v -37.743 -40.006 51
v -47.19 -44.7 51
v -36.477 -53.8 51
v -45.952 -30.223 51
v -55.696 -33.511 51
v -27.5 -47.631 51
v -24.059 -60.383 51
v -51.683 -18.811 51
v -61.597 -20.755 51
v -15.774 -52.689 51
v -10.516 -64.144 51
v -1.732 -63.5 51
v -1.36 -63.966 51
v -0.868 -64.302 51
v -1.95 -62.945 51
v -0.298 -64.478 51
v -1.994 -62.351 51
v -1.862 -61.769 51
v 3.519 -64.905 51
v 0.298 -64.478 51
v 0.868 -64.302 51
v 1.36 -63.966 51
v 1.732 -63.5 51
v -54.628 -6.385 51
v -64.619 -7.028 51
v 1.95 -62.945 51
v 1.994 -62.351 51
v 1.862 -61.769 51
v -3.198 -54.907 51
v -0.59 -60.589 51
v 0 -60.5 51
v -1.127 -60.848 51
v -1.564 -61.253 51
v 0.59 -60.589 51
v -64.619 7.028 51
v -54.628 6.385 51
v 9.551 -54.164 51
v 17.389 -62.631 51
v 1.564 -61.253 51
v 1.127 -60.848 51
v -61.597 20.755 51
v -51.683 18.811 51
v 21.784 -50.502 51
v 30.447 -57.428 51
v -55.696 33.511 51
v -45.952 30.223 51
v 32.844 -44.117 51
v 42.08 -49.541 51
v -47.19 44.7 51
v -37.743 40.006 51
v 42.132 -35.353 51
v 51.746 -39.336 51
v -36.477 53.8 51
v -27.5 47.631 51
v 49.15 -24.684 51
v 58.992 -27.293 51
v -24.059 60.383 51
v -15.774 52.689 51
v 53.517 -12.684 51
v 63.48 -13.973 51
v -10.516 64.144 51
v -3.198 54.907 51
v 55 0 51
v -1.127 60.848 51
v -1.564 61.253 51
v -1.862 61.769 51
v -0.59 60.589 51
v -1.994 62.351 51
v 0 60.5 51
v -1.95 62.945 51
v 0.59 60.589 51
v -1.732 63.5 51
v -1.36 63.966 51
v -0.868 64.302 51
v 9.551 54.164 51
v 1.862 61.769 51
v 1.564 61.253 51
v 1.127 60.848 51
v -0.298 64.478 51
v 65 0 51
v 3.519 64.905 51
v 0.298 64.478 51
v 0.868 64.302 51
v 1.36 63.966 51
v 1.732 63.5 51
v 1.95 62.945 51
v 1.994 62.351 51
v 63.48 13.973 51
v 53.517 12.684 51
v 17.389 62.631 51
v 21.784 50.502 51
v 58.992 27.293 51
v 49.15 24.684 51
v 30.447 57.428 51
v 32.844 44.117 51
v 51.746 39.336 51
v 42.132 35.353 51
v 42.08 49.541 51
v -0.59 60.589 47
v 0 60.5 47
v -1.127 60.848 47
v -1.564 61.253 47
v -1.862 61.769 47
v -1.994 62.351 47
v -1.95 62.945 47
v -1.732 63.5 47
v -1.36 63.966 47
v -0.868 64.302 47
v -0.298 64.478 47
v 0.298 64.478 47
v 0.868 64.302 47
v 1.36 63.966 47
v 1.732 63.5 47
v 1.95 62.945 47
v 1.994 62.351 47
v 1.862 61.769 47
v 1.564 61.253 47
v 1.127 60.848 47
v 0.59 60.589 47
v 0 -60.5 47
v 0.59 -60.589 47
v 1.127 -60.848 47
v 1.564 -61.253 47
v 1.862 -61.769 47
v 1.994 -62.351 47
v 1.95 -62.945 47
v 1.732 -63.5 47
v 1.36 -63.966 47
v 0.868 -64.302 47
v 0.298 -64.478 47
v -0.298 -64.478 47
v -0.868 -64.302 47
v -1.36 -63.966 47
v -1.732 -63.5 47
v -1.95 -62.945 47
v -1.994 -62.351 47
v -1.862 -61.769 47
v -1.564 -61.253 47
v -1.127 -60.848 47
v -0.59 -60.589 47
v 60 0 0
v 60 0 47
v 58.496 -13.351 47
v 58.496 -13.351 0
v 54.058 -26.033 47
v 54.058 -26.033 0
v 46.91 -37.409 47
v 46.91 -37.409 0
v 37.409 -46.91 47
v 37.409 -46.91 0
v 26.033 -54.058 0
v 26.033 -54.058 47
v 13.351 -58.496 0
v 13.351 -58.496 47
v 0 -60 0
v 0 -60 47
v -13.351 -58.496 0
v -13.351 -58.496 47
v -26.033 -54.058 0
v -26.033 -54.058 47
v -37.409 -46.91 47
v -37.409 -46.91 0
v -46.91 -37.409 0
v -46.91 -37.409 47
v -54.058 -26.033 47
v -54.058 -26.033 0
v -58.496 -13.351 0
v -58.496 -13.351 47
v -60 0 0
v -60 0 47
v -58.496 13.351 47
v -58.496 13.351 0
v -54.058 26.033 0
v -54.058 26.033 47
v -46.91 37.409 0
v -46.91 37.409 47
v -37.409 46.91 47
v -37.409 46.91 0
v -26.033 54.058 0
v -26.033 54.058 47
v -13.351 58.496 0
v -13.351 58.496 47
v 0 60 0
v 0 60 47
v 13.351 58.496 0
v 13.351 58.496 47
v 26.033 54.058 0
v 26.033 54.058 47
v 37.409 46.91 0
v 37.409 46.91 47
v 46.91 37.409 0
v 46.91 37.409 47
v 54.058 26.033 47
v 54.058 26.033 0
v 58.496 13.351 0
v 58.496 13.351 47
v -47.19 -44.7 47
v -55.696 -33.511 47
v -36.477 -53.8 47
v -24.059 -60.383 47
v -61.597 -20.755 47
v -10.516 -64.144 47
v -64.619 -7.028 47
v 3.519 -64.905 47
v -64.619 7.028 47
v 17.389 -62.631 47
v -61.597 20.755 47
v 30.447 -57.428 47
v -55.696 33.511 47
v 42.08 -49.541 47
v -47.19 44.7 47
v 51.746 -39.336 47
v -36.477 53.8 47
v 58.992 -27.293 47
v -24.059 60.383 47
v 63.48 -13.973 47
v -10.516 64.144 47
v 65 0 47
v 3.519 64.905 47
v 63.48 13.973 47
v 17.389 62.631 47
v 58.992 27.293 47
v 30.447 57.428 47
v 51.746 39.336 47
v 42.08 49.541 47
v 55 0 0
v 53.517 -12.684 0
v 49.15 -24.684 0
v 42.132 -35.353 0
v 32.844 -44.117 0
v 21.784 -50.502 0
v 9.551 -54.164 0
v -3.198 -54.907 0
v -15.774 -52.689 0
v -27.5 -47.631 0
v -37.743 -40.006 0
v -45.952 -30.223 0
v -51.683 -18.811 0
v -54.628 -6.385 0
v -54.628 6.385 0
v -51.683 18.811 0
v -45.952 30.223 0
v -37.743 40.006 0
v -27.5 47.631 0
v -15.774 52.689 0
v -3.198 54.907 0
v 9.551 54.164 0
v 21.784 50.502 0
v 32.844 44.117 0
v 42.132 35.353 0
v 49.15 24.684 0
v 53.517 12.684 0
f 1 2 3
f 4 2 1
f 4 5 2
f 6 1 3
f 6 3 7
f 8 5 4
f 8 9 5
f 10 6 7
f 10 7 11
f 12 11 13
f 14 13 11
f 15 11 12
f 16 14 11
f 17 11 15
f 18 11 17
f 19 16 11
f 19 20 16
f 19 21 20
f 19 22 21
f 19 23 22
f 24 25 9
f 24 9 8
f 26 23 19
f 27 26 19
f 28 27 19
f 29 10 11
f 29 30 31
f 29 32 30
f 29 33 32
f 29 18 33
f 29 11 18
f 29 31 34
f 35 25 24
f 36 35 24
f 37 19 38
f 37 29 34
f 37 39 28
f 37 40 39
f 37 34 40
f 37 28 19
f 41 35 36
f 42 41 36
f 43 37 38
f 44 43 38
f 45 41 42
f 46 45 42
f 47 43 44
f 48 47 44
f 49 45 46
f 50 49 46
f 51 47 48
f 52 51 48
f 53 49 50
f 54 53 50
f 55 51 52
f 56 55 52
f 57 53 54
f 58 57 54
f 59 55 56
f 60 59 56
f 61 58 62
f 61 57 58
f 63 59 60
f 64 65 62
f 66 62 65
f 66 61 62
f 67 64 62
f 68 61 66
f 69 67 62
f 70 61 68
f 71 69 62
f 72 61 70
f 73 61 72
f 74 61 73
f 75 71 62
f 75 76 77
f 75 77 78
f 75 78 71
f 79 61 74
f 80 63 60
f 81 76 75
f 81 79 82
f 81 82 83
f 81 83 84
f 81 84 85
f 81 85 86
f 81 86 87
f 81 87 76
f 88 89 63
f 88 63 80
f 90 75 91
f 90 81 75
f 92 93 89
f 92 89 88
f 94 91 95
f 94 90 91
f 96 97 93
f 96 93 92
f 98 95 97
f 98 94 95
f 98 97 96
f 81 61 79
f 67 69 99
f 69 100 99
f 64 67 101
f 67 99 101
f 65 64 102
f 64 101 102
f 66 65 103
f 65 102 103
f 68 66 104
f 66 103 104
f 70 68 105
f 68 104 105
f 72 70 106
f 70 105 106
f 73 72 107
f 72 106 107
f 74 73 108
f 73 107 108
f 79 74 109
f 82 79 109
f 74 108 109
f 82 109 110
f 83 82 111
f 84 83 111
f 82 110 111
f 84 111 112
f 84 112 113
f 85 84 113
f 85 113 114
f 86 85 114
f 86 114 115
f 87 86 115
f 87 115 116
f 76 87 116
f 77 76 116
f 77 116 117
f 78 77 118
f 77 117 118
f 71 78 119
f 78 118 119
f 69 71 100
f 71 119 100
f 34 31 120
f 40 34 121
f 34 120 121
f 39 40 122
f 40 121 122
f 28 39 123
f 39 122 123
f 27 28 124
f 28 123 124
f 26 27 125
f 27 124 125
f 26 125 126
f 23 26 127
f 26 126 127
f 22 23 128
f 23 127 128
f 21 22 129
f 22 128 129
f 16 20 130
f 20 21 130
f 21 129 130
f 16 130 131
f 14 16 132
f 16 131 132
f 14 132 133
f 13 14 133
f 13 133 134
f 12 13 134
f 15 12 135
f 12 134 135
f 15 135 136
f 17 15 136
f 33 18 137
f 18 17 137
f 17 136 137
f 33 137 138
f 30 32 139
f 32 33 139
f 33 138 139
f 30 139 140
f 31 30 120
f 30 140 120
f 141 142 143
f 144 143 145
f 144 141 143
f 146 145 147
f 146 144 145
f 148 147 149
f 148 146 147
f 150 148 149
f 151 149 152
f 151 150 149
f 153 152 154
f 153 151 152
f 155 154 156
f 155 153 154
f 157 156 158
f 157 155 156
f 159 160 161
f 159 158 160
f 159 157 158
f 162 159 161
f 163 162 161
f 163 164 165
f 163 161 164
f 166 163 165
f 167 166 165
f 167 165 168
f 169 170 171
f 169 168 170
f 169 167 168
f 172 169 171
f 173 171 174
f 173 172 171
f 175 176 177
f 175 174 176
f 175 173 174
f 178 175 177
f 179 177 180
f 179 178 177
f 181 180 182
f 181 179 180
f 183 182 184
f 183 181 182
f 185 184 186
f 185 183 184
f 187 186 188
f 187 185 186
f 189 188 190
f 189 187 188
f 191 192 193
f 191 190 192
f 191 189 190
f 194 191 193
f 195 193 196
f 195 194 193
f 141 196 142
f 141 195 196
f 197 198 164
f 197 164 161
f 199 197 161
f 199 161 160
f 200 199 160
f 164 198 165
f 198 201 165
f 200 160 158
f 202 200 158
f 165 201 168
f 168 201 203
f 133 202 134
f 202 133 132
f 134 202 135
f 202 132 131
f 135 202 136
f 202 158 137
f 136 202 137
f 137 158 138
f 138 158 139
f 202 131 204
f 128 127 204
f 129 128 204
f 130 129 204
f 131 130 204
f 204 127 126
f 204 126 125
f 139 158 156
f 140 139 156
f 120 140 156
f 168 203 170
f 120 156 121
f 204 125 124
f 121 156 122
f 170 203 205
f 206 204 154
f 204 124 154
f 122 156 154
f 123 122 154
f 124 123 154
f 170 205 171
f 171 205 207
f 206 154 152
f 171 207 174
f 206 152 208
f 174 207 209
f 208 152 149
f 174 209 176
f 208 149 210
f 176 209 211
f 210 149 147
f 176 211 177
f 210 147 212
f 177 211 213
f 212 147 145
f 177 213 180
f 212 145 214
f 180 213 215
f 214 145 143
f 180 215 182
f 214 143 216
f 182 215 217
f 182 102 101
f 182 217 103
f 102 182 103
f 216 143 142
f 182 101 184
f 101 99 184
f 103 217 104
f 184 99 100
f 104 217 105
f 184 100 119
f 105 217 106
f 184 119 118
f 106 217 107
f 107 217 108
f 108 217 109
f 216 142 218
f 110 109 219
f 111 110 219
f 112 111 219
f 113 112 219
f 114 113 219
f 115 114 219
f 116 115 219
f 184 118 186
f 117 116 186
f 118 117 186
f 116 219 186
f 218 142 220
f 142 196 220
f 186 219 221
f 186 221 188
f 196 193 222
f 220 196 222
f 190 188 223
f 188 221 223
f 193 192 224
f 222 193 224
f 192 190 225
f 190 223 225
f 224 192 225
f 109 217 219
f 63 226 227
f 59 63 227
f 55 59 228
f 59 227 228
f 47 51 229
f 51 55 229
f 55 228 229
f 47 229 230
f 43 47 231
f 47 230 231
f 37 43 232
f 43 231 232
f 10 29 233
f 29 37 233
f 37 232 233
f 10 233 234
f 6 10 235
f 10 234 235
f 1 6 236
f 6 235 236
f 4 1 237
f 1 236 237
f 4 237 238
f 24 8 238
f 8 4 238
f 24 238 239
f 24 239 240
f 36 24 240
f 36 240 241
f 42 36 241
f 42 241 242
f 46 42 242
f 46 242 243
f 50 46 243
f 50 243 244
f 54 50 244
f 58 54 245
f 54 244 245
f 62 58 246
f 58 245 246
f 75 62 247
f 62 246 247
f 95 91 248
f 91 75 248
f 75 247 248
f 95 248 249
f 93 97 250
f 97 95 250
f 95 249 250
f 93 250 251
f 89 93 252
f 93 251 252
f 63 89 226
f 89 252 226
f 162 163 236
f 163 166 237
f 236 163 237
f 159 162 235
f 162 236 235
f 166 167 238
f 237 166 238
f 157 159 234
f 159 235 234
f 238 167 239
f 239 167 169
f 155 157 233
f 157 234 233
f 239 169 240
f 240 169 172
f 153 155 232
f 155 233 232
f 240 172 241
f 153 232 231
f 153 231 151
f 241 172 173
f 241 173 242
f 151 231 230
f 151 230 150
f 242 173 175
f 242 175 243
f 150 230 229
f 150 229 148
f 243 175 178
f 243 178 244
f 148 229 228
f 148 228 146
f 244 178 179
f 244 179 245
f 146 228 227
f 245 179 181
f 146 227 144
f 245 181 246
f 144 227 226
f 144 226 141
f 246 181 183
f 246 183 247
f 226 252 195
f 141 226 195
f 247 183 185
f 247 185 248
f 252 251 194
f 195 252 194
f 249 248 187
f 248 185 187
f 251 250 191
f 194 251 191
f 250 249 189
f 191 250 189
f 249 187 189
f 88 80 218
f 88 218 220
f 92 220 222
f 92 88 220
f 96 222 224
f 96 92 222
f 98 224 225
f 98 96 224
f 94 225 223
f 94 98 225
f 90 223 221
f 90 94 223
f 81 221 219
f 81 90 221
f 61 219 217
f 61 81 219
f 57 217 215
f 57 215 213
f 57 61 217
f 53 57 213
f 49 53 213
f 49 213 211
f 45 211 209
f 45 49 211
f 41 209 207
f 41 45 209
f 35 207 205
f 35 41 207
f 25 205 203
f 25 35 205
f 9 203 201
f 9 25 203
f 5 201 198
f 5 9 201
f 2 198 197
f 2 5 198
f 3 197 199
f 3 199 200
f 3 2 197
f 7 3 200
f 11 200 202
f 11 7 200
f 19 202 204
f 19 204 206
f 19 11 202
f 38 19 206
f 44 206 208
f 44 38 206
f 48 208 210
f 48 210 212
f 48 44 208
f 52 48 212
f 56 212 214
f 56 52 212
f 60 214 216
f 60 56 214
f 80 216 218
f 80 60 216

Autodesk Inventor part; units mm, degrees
ref_plane "YZ Plane" through (0, 0, 0) normal (1, 0, 0) x (0, 1, 0)
ref_plane "XZ Plane" through (0, 0, 0) normal (0, 1, 0) x (-1, 0, 0)
ref_plane "XY Plane" through (0, 0, 0) normal (0, 0, 1) x (1, 0, 0)
sketch "Эскиз1" plane through (0, 0, 0) normal (0, 0, 1) x (1, 0, 0)
  circle A0 centre (0, 0) radius 60
  circle A1 centre (0, 0) radius 55
  dimension "d0" = 120
  dimension "d1" = 110
extrude "Выдавливание1" add sketch "Эскиз1" along normal blind 51
sketch "Эскиз2" plane through (0, 0, 51) normal (0, 0, 1) x (1, 0, 0)
  circle A0 centre (0, 0) radius 60 projected
  circle A1 centre (0, 0) radius 65
extrude "Выдавливание2" add sketch "Эскиз2" against normal blind 4
sketch "Эскиз3" plane through (0, 0, 51) normal (0, 0, 1) x (1, 0, 0)
  circle A0 centre (0, 0) radius 55 projected
  line L0 (0, 55) -> (0, 62.5)
  dimension "d6" = 7.5
hole "Отверстие1" at (0, 62.5, 51) direction (0, 0, -1) diameter 4 depth 15 tip angle 118
mirror "Зеркальное отражение1" about plane through (0, 0, 0) normal (0, 1, 0) of "Отверстие1"
properties part number "Втулка под палец" material "Бронза, литейная"
